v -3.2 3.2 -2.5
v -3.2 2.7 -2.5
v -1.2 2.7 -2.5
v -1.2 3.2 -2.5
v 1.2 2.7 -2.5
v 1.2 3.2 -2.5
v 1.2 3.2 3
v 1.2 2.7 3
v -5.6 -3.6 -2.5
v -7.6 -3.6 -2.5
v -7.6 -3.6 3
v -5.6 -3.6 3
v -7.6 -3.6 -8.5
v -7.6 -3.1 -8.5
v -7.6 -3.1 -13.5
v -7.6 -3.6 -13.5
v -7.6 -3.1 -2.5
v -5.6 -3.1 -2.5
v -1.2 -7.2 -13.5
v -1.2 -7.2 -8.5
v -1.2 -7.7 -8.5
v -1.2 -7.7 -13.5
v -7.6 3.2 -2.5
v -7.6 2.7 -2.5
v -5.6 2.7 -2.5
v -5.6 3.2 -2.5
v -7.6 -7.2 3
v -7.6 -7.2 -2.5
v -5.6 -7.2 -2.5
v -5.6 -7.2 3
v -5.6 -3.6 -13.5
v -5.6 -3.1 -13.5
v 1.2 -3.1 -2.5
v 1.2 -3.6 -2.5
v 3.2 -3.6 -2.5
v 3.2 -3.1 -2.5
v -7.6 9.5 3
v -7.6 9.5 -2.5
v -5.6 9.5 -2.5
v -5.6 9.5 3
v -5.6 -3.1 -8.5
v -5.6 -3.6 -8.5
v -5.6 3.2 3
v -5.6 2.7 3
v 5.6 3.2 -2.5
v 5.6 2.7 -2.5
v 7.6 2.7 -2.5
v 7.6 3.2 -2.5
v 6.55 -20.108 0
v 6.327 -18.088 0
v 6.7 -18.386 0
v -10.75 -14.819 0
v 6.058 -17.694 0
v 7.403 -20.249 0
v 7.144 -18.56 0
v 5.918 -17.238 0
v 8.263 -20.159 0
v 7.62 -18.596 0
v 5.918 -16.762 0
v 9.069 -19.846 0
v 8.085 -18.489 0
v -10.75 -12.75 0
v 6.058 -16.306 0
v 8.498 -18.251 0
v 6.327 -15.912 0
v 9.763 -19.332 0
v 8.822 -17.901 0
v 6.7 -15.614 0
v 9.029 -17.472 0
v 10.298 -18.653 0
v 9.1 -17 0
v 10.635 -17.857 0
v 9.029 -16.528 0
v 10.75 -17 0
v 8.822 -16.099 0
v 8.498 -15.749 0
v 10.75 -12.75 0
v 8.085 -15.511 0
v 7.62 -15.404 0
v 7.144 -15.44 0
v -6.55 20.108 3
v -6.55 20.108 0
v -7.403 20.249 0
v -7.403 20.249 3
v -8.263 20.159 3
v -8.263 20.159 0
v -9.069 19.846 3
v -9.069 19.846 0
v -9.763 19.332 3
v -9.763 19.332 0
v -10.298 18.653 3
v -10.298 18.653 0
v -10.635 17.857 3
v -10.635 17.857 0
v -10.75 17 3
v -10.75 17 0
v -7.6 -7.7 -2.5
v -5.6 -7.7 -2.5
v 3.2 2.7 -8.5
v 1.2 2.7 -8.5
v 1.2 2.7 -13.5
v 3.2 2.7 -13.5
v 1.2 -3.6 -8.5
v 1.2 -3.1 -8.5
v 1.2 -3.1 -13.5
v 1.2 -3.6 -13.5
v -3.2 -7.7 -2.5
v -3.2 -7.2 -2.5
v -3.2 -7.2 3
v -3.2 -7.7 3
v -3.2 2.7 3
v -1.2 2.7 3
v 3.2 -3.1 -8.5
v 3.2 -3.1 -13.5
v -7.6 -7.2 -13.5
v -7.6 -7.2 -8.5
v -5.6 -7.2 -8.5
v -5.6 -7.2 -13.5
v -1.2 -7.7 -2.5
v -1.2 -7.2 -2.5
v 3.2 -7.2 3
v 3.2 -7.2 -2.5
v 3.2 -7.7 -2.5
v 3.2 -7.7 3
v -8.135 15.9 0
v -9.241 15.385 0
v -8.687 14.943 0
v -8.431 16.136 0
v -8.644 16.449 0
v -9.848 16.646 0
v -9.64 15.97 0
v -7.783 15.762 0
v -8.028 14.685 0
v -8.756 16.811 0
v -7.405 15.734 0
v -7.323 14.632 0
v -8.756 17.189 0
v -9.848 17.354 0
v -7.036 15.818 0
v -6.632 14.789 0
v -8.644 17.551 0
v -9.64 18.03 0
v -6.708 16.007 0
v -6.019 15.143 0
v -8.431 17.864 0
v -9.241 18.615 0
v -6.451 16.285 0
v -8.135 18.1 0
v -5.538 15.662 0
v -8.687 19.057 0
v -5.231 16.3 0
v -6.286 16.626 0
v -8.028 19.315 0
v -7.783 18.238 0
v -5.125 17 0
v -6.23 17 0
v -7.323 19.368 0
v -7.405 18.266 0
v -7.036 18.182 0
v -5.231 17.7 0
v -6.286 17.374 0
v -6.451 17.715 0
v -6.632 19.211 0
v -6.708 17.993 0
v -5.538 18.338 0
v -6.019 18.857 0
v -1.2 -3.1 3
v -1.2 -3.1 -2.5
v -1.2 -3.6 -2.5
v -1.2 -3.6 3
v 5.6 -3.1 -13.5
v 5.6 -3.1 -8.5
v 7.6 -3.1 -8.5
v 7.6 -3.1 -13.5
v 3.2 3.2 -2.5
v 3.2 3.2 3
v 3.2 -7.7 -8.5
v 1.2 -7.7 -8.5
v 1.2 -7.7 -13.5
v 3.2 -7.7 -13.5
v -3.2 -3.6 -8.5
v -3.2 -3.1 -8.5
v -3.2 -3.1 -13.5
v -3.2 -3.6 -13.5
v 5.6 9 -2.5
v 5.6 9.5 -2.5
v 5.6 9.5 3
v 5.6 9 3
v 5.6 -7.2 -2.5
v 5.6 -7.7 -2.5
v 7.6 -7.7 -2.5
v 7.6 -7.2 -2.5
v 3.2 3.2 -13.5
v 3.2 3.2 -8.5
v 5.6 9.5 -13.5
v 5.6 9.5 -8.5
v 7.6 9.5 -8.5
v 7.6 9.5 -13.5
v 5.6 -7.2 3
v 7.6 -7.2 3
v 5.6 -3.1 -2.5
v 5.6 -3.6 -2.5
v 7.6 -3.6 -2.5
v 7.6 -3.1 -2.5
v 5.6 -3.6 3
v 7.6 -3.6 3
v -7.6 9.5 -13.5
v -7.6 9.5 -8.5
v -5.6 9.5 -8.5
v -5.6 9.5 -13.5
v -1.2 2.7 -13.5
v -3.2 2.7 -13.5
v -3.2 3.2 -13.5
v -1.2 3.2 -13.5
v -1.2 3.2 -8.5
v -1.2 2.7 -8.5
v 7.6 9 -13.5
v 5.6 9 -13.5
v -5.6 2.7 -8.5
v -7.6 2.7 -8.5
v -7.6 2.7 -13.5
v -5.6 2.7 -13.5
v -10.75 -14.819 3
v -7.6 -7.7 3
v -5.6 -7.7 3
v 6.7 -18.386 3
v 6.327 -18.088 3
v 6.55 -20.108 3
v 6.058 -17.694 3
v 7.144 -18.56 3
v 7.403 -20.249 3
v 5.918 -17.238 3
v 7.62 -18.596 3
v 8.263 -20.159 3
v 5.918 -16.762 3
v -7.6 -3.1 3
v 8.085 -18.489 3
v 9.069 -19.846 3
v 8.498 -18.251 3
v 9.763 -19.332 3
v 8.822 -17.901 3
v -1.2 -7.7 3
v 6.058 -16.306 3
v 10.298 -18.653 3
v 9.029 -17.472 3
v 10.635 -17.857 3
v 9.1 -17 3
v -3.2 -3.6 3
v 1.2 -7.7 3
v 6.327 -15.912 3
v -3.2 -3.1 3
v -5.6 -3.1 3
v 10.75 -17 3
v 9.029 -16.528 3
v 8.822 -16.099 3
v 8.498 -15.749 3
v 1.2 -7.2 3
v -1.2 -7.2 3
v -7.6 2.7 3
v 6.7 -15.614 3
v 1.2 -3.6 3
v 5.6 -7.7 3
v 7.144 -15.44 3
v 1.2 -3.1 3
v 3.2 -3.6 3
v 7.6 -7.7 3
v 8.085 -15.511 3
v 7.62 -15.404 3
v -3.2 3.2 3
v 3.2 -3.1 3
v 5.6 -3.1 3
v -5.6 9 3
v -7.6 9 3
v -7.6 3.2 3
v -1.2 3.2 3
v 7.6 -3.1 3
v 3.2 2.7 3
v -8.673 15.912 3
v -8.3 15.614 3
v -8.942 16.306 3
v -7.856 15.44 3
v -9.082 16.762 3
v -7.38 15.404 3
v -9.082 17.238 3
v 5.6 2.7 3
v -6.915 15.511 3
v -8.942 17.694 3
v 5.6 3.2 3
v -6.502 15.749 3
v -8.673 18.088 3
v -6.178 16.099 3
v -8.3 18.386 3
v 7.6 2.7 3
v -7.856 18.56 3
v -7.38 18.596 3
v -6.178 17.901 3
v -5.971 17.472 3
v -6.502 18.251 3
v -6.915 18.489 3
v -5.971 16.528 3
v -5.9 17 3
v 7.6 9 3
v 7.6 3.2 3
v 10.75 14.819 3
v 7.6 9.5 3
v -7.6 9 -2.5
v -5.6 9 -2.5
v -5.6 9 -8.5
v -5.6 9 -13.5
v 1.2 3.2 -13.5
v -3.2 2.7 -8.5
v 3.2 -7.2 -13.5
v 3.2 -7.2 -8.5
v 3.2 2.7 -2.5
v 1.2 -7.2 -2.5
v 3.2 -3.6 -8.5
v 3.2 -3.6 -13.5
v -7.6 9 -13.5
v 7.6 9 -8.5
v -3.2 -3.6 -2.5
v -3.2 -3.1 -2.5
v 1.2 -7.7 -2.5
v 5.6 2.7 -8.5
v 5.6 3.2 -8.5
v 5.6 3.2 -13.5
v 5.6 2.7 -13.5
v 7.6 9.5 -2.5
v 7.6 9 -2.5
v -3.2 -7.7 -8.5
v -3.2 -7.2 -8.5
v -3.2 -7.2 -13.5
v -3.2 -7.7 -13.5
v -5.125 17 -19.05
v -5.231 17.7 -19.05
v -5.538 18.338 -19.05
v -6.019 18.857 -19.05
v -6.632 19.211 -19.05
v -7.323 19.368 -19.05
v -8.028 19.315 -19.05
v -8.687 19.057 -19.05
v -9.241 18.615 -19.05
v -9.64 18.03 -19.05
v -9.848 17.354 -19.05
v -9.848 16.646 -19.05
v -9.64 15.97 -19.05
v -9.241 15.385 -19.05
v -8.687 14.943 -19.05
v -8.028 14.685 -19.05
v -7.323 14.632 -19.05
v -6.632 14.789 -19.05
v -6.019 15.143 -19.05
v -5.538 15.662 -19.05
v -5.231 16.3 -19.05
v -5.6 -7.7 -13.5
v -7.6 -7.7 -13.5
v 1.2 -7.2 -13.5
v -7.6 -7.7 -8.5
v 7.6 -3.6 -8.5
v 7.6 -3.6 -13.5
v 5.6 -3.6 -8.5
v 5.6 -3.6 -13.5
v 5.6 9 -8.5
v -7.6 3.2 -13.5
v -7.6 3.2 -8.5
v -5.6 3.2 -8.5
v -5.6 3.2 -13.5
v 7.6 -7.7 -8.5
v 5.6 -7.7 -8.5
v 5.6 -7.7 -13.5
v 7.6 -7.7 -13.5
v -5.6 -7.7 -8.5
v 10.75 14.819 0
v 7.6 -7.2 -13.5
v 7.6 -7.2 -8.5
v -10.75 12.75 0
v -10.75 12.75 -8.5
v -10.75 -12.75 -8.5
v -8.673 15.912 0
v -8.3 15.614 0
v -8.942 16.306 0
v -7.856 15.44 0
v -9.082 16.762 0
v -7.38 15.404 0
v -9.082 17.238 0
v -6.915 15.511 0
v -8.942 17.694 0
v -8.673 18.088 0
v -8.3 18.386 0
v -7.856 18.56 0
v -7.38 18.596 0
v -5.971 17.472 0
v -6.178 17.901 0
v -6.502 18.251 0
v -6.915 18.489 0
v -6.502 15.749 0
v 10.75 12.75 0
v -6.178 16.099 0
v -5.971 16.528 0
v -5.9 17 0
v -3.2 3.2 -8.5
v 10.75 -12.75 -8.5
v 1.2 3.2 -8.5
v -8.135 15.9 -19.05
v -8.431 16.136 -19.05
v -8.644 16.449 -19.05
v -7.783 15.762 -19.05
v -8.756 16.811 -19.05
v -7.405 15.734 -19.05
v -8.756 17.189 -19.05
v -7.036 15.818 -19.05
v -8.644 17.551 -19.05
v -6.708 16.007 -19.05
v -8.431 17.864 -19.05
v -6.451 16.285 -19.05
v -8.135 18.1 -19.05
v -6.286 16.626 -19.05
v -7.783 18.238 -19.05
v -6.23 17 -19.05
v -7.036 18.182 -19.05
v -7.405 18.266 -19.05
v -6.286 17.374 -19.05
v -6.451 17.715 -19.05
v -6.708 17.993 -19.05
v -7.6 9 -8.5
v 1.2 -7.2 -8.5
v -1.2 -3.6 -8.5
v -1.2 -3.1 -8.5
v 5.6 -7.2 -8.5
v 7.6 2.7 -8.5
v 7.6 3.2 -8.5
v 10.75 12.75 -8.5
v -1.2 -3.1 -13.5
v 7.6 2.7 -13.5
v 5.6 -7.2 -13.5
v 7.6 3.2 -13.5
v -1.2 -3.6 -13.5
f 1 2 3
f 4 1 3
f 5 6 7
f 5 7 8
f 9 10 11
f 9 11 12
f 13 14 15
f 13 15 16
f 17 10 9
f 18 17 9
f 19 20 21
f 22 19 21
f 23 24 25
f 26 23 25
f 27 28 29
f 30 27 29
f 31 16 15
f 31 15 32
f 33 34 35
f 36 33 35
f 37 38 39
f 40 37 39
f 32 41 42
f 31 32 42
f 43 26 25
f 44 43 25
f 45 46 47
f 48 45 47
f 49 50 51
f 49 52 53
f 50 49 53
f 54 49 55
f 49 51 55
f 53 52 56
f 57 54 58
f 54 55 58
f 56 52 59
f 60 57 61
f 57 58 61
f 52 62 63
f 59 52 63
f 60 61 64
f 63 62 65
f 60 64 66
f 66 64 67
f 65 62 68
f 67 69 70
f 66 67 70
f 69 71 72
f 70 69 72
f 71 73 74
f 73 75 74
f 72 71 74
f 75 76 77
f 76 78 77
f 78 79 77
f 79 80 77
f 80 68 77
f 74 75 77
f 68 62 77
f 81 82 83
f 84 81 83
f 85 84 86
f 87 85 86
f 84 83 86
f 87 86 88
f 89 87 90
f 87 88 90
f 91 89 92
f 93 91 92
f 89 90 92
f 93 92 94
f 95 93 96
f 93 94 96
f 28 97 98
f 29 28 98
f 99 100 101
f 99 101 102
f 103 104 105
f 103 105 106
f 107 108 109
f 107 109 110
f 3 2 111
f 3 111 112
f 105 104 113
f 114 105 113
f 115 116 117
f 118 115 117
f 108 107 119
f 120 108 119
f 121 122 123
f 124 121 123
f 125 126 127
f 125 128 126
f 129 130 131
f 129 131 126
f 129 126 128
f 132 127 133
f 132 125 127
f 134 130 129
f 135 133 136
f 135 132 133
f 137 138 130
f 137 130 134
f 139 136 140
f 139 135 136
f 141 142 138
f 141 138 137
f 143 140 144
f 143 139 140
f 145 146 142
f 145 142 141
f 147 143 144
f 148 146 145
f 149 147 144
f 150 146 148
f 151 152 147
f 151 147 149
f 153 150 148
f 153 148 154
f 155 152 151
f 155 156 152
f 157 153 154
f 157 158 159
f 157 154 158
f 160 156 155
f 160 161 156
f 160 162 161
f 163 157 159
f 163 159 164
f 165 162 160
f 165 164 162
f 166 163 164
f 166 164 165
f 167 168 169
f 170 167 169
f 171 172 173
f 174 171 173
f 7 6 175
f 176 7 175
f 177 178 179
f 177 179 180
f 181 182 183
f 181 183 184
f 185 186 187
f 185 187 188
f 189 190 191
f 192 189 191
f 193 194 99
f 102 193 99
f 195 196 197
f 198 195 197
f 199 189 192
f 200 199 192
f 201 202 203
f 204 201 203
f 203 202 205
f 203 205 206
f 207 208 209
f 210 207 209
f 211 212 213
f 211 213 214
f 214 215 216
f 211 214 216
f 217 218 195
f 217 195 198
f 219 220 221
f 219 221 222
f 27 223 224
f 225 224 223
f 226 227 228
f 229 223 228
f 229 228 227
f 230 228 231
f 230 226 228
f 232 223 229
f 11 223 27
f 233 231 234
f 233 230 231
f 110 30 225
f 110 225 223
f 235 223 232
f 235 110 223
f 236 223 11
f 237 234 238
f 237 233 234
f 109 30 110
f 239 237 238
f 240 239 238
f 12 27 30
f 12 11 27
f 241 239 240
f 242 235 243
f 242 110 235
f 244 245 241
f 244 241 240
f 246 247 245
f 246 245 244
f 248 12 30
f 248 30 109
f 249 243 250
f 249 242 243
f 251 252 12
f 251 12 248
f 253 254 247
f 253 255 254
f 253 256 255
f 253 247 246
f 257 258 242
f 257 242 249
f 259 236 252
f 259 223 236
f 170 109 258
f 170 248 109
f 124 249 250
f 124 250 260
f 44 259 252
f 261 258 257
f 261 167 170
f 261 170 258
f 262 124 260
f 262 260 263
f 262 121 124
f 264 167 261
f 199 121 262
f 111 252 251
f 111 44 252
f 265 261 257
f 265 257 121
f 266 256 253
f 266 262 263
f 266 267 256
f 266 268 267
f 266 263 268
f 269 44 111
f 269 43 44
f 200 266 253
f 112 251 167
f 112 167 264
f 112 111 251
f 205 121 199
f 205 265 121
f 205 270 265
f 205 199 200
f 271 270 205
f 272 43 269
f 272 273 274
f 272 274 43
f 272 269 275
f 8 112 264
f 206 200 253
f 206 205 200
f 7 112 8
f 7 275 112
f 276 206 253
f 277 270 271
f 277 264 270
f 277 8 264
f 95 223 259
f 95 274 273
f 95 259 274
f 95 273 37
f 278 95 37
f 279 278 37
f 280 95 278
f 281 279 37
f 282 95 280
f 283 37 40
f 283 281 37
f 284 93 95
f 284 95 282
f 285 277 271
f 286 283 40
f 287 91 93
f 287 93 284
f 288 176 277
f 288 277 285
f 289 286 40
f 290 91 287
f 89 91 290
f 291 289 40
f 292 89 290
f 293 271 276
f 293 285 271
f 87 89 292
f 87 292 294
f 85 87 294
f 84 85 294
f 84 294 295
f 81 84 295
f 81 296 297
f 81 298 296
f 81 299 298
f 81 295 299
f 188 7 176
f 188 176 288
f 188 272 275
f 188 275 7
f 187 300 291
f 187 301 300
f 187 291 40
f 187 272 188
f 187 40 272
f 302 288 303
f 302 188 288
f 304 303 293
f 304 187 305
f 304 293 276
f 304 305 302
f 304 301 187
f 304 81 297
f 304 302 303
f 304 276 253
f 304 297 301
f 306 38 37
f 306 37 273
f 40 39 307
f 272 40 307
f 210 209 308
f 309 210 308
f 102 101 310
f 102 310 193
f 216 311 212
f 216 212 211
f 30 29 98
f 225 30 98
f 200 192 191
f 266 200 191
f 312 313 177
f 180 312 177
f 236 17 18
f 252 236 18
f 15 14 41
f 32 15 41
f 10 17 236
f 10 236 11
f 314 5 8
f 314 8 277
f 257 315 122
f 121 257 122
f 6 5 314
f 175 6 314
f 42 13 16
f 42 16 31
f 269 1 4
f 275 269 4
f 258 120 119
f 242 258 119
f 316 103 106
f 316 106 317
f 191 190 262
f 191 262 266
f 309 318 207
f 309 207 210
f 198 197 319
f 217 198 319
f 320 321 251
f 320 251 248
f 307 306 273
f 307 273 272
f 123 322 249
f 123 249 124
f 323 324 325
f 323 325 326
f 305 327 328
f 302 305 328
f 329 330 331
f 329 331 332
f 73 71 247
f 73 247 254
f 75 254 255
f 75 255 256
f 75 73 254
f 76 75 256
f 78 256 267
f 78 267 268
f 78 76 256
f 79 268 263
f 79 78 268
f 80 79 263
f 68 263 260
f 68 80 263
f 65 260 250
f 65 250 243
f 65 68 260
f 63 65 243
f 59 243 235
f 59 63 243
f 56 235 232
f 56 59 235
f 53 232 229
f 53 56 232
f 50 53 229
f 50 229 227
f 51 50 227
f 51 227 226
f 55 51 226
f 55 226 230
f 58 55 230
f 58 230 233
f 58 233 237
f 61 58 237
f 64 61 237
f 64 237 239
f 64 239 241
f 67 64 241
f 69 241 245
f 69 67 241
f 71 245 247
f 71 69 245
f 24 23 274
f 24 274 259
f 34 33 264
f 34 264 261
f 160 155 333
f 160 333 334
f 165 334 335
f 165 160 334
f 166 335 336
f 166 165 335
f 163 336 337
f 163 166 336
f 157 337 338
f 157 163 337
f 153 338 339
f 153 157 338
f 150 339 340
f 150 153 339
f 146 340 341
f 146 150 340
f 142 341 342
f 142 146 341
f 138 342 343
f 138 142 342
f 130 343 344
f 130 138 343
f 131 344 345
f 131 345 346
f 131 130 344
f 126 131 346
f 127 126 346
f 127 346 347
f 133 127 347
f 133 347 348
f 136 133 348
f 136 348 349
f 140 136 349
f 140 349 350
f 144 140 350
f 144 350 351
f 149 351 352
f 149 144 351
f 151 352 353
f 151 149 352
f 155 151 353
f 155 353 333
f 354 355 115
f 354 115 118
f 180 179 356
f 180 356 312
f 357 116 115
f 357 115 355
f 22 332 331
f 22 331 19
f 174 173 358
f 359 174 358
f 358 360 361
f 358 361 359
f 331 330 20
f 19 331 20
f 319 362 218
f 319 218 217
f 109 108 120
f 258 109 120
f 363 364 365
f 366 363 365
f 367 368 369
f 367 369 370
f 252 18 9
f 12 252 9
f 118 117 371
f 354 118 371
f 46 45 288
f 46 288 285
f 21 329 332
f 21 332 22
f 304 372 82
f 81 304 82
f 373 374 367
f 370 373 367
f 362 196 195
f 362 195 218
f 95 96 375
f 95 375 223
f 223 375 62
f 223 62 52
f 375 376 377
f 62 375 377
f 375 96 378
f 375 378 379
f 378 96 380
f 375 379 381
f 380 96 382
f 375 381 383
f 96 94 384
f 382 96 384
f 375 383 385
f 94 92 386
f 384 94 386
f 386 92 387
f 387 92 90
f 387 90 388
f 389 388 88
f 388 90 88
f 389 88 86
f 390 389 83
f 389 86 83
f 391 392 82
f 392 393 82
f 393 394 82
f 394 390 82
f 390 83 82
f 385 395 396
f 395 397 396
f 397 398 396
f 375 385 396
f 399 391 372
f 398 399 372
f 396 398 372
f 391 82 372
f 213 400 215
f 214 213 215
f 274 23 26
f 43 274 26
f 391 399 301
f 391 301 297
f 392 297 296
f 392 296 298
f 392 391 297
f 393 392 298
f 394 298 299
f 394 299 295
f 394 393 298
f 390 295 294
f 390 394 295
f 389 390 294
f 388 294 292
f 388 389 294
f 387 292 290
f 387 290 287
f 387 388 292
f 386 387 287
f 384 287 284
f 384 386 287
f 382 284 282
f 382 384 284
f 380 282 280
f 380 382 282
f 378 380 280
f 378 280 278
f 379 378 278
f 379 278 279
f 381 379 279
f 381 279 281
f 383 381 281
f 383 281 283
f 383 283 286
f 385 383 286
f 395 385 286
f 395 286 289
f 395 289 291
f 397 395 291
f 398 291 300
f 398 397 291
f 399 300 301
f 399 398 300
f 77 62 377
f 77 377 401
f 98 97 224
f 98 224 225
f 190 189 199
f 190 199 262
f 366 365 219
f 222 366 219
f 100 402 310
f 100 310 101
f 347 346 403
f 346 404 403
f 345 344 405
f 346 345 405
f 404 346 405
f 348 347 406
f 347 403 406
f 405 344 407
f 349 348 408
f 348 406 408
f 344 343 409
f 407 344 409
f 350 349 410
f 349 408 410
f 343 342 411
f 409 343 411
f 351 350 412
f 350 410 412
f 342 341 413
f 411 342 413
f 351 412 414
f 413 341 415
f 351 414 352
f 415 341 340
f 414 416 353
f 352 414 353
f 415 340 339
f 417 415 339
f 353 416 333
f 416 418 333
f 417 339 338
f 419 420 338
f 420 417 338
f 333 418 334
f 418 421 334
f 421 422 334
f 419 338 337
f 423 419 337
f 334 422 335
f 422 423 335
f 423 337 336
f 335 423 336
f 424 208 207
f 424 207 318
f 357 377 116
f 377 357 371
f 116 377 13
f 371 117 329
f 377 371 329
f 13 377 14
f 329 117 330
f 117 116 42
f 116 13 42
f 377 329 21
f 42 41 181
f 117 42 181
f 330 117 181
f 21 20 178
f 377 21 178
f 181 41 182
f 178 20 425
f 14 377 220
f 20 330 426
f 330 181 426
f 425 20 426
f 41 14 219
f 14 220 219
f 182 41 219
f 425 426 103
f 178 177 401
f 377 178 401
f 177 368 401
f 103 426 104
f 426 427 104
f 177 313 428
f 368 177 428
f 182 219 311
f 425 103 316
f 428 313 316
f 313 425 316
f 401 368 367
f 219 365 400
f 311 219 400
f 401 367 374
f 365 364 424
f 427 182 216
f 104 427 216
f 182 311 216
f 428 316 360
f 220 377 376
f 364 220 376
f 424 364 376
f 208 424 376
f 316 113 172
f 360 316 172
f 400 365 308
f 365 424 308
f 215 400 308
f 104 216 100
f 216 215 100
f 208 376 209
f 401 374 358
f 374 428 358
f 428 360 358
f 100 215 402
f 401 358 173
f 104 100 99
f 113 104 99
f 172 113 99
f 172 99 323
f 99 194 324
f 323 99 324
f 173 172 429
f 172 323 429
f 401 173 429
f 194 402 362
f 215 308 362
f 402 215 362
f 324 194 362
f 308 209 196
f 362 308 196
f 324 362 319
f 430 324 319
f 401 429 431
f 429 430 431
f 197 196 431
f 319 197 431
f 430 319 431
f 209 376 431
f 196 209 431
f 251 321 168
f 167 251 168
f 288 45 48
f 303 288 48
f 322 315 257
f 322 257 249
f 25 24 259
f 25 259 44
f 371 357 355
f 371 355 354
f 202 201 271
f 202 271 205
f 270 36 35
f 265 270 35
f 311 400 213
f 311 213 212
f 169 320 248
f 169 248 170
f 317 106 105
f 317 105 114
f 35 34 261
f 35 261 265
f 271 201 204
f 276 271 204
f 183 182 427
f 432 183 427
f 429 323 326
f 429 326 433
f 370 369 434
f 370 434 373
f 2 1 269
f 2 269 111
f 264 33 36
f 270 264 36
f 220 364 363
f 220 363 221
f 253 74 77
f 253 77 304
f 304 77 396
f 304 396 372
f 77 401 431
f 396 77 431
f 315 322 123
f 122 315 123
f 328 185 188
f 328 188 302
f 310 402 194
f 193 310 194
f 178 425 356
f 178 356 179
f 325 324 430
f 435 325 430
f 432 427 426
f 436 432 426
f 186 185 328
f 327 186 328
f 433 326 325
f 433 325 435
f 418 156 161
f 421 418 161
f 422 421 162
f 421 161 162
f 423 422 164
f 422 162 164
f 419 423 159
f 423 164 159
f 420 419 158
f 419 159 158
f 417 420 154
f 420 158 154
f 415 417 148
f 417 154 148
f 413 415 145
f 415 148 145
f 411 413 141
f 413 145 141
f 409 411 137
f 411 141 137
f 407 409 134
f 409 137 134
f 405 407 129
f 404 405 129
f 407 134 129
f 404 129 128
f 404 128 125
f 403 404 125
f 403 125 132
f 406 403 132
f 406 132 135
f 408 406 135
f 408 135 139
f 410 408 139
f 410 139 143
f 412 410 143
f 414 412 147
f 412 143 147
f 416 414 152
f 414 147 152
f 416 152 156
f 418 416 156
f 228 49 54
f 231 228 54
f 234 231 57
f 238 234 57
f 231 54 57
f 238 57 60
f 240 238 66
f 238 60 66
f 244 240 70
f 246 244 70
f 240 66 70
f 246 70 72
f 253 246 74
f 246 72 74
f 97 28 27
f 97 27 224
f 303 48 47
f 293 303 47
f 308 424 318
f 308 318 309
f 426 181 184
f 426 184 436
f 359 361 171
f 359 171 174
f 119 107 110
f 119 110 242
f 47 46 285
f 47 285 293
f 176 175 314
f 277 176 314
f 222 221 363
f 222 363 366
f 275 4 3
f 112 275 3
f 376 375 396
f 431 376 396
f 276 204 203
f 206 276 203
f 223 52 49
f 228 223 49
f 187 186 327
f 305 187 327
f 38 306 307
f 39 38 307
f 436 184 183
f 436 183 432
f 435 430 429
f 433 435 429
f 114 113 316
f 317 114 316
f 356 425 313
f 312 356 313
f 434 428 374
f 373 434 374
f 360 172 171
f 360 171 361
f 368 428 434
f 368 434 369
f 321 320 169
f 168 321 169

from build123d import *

# Parameters (mm, degrees)
F0_R     = 1.6
F1_DEPTH = 3
F2_W     = 21.5
F2_H     = 25.5
F3_DEPTH = 8.5
F4_W     = 2
F4_H     = 0.5
F5_DEPTH = 5
F6_START = -6
F6_DEPTH = 5.5
F7_R     = 2.3749
F7_R_2   = 1.27
F8_DEPTH = 19.05


with BuildPart() as f1:
    # F0 (on Top) → F1 (new body)
    with BuildSketch(Plane.XY):
        with BuildLine():
            ThreePointArc((-6.5497919597, 20.1079904569), (-9.4331740569, 19.612534797), (-10.75, 17))
            Line((-10.75, 17), (-10.75, -14.818913272))
            Line((-10.75, -14.818913272), (6.5497919597, -20.1079904569))
            ThreePointArc((6.5497919597, -20.1079904569), (9.4331740569, -19.612534797), (10.75, -17))
            Line((10.75, -17), (10.75, 14.818913272))
            Line((10.75, 14.818913272), (-6.5497919597, 20.1079904569))
        make_face()
        with Locations((7.5, -17)):
            Circle(F0_R, mode=Mode.SUBTRACT)
        with Locations((-7.5, 17)):
            Circle(F0_R, mode=Mode.SUBTRACT)
    extrude(amount=F1_DEPTH)

    # F2 (on Top) → F3 (join)
    with BuildSketch(Plane.XY):
        Rectangle(F2_W, F2_H)
    extrude(amount=-F3_DEPTH)

    # F4 (on face) → F5 (join)
    with BuildSketch(Plane(origin=(0, 0, -8.5), x_dir=(1, 0, 0), z_dir=(0, 0, -1))):
        with Locations((-6.6, 7.45)):
            Rectangle(F4_W, F4_H)
        with Locations((-2.2, 7.45)):
            Rectangle(F4_W, F4_H)
        with Locations((2.2, 7.45)):
            Rectangle(F4_W, F4_H)
        with Locations((6.6, 7.45)):
            Rectangle(F4_W, F4_H)
        with Locations((6.6, 3.35)):
            Rectangle(F4_W, F4_H)
        with Locations((-6.6, 3.35)):
            Rectangle(F4_W, F4_H)
        with Locations((-2.2, 3.35)):
            Rectangle(F4_W, F4_H)
        with Locations((2.2, 3.35)):
            Rectangle(F4_W, F4_H)
        with Locations((2.2, -2.95)):
            Rectangle(F4_W, F4_H)
        with Locations((-2.2, -2.95)):
            Rectangle(F4_W, F4_H)
        with Locations((6.6, -2.95)):
            Rectangle(F4_W, F4_H)
        with Locations((-6.6, -2.95)):
            Rectangle(F4_W, F4_H)
        with Locations((6.6, -9.25)):
            Rectangle(F4_W, F4_H)
        with Locations((-6.6, -9.25)):
            Rectangle(F4_W, F4_H)
    extrude(amount=F5_DEPTH)

    # F4 (on face) → F6 (cut)
    with BuildSketch(Plane(origin=(0, 0, -8.5), x_dir=(1, 0, 0), z_dir=(0, 0, -1)).offset(F6_START)):
        with Locations((-6.6, 7.45)):
            Rectangle(F4_W, F4_H)
        with Locations((-2.2, 7.45)):
            Rectangle(F4_W, F4_H)
        with Locations((2.2, 7.45)):
            Rectangle(F4_W, F4_H)
        with Locations((6.6, 7.45)):
            Rectangle(F4_W, F4_H)
        with Locations((6.6, 3.35)):
            Rectangle(F4_W, F4_H)
        with Locations((-6.6, 3.35)):
            Rectangle(F4_W, F4_H)
        with Locations((-2.2, 3.35)):
            Rectangle(F4_W, F4_H)
        with Locations((2.2, 3.35)):
            Rectangle(F4_W, F4_H)
        with Locations((2.2, -2.95)):
            Rectangle(F4_W, F4_H)
        with Locations((-2.2, -2.95)):
            Rectangle(F4_W, F4_H)
        with Locations((6.6, -2.95)):
            Rectangle(F4_W, F4_H)
        with Locations((-6.6, -2.95)):
            Rectangle(F4_W, F4_H)
        with Locations((6.6, -9.25)):
            Rectangle(F4_W, F4_H)
        with Locations((-6.6, -9.25)):
            Rectangle(F4_W, F4_H)
    extrude(amount=-F6_DEPTH, mode=Mode.SUBTRACT)


with BuildPart() as f8:
    # F7 (on Top) → F8 (new body)
    with BuildSketch(Plane.XY):
        with Locations((-7.5, 17)):
            Circle(F7_R)
        with Locations((-7.5, 17)):
            Circle(F7_R_2, mode=Mode.SUBTRACT)
    extrude(amount=-F8_DEPTH)


solid = Compound([f1.part, f8.part])
